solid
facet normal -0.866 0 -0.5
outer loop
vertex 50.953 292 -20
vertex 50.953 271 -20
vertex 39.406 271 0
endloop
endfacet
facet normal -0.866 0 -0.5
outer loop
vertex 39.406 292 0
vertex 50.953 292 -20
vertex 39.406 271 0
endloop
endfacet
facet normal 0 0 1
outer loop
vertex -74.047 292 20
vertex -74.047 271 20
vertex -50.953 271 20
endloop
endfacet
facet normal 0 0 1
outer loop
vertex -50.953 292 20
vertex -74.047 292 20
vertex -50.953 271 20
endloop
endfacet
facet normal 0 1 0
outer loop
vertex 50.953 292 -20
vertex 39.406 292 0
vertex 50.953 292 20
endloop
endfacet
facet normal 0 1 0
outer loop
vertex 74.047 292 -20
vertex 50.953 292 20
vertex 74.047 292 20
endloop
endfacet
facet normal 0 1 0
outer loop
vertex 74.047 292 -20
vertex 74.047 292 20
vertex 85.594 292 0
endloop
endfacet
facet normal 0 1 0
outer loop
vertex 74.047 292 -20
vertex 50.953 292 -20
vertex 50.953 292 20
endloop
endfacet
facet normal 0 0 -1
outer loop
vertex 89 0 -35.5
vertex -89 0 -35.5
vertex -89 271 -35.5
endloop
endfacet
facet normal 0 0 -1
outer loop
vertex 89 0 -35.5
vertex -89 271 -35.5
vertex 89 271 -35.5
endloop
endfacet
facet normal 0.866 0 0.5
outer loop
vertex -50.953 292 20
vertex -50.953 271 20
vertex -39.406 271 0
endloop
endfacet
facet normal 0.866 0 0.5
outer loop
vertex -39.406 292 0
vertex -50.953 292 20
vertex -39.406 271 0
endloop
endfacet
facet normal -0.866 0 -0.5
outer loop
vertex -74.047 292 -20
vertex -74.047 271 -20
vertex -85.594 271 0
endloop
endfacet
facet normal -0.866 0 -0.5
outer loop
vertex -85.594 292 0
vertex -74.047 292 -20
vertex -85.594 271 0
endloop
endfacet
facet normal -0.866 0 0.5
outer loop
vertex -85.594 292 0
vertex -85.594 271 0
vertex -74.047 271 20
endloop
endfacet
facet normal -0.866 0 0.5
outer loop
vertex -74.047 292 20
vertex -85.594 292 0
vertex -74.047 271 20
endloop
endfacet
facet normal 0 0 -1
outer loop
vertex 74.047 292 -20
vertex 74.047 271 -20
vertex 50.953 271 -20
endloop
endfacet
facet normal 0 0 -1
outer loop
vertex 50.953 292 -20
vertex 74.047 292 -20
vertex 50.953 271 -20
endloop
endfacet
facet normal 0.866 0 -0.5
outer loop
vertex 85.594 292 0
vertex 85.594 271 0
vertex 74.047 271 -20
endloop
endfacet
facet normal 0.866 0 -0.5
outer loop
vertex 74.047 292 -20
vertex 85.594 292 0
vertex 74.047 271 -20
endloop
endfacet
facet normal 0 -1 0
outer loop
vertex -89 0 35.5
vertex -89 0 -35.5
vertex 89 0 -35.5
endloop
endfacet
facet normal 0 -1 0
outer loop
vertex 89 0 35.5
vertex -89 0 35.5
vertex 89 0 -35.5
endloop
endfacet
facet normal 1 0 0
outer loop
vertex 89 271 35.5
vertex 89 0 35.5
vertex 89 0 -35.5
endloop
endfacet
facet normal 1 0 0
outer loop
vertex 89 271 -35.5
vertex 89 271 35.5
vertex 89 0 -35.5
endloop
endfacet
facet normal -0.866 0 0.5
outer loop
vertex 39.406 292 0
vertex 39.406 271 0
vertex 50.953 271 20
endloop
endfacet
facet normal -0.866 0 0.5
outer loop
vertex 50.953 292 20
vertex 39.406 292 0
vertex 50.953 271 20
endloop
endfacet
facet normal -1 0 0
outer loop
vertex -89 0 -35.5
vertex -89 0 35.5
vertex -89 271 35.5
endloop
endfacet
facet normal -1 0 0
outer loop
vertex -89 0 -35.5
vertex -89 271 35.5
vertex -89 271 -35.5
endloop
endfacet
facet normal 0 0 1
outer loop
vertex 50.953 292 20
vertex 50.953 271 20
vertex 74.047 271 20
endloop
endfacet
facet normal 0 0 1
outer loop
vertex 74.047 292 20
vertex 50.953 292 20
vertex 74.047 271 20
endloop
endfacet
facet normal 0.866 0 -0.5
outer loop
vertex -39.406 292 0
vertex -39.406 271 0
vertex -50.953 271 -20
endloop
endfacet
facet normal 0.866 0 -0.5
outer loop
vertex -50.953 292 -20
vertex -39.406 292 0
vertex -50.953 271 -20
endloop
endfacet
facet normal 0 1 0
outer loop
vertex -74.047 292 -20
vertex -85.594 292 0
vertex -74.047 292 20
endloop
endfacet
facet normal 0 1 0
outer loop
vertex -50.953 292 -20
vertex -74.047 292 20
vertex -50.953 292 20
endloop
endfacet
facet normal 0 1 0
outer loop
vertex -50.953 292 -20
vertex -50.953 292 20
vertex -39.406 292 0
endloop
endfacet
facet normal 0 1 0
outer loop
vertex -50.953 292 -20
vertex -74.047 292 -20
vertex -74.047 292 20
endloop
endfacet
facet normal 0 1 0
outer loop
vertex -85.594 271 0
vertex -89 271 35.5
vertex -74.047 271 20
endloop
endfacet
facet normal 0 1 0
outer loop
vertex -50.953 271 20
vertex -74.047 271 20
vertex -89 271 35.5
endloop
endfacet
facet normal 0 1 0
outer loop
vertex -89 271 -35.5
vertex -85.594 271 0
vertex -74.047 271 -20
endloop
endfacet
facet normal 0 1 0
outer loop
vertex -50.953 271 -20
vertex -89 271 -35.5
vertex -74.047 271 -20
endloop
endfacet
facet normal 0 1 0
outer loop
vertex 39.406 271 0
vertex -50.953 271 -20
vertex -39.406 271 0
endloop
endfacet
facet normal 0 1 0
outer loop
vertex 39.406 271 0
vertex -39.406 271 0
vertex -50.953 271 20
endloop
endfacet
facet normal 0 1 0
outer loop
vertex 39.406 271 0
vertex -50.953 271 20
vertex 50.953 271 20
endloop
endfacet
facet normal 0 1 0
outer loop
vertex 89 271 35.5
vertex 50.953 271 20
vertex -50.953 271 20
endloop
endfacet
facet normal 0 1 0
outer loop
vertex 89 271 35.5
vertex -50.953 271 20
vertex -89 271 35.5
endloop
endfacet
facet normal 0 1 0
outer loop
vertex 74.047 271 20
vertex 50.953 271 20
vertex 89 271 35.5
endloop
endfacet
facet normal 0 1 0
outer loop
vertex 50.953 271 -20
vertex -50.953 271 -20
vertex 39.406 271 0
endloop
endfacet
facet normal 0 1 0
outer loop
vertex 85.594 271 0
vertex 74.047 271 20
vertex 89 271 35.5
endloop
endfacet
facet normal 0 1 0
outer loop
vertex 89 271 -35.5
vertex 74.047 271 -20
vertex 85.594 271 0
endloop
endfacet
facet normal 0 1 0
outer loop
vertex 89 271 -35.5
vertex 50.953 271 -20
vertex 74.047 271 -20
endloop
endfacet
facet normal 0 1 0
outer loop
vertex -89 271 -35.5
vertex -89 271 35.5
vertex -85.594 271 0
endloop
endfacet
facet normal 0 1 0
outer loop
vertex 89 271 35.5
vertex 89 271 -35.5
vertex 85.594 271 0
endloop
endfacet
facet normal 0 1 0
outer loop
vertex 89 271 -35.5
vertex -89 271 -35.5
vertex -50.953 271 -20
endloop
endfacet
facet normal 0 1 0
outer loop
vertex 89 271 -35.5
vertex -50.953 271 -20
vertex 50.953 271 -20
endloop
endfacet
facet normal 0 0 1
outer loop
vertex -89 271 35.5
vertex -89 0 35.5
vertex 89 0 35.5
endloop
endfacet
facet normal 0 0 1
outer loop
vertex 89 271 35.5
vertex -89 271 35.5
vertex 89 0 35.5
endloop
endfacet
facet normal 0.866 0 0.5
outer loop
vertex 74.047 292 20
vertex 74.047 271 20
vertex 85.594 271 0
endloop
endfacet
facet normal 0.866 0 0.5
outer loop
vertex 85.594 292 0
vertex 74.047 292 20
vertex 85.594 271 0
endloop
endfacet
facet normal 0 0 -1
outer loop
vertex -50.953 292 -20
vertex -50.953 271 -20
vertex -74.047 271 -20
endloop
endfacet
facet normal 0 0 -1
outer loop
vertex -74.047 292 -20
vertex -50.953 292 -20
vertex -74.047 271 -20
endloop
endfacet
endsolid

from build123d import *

# Parameters (mm, degrees)
SKETCH1_W           = 178
SKETCH1_H           = 71
BOSS_EXTRUDE1_DEPTH = 271
BOSS_EXTRUDE2_DEPTH = 21


with BuildPart() as part:
    # Sketch1 → Boss-Extrude1 (new body)
    with BuildSketch(Plane(origin=(0, 0, 0), x_dir=(1, 0, 0), z_dir=(0, 1, 0))):
        Rectangle(SKETCH1_W, SKETCH1_H)
    extrude(amount=BOSS_EXTRUDE1_DEPTH)

    # Sketch2 → Boss-Extrude2 (add)
    with BuildSketch(Plane(origin=(0, 271, 0), x_dir=(1, 0, 0), z_dir=(0, 1, 0))):
        Polygon((-39.405989232, 0), (-50.952994616, 20), (-74.047005384, 20), (-85.594010768, 0), (-74.047005384, -20), (-50.952994616, -20), align=None)
        Polygon((85.594010768, 0), (74.047005384, 20), (50.952994616, 20), (39.405989232, 0), (50.952994616, -20), (74.047005384, -20), align=None)
    extrude(amount=BOSS_EXTRUDE2_DEPTH)


solid = part.part
